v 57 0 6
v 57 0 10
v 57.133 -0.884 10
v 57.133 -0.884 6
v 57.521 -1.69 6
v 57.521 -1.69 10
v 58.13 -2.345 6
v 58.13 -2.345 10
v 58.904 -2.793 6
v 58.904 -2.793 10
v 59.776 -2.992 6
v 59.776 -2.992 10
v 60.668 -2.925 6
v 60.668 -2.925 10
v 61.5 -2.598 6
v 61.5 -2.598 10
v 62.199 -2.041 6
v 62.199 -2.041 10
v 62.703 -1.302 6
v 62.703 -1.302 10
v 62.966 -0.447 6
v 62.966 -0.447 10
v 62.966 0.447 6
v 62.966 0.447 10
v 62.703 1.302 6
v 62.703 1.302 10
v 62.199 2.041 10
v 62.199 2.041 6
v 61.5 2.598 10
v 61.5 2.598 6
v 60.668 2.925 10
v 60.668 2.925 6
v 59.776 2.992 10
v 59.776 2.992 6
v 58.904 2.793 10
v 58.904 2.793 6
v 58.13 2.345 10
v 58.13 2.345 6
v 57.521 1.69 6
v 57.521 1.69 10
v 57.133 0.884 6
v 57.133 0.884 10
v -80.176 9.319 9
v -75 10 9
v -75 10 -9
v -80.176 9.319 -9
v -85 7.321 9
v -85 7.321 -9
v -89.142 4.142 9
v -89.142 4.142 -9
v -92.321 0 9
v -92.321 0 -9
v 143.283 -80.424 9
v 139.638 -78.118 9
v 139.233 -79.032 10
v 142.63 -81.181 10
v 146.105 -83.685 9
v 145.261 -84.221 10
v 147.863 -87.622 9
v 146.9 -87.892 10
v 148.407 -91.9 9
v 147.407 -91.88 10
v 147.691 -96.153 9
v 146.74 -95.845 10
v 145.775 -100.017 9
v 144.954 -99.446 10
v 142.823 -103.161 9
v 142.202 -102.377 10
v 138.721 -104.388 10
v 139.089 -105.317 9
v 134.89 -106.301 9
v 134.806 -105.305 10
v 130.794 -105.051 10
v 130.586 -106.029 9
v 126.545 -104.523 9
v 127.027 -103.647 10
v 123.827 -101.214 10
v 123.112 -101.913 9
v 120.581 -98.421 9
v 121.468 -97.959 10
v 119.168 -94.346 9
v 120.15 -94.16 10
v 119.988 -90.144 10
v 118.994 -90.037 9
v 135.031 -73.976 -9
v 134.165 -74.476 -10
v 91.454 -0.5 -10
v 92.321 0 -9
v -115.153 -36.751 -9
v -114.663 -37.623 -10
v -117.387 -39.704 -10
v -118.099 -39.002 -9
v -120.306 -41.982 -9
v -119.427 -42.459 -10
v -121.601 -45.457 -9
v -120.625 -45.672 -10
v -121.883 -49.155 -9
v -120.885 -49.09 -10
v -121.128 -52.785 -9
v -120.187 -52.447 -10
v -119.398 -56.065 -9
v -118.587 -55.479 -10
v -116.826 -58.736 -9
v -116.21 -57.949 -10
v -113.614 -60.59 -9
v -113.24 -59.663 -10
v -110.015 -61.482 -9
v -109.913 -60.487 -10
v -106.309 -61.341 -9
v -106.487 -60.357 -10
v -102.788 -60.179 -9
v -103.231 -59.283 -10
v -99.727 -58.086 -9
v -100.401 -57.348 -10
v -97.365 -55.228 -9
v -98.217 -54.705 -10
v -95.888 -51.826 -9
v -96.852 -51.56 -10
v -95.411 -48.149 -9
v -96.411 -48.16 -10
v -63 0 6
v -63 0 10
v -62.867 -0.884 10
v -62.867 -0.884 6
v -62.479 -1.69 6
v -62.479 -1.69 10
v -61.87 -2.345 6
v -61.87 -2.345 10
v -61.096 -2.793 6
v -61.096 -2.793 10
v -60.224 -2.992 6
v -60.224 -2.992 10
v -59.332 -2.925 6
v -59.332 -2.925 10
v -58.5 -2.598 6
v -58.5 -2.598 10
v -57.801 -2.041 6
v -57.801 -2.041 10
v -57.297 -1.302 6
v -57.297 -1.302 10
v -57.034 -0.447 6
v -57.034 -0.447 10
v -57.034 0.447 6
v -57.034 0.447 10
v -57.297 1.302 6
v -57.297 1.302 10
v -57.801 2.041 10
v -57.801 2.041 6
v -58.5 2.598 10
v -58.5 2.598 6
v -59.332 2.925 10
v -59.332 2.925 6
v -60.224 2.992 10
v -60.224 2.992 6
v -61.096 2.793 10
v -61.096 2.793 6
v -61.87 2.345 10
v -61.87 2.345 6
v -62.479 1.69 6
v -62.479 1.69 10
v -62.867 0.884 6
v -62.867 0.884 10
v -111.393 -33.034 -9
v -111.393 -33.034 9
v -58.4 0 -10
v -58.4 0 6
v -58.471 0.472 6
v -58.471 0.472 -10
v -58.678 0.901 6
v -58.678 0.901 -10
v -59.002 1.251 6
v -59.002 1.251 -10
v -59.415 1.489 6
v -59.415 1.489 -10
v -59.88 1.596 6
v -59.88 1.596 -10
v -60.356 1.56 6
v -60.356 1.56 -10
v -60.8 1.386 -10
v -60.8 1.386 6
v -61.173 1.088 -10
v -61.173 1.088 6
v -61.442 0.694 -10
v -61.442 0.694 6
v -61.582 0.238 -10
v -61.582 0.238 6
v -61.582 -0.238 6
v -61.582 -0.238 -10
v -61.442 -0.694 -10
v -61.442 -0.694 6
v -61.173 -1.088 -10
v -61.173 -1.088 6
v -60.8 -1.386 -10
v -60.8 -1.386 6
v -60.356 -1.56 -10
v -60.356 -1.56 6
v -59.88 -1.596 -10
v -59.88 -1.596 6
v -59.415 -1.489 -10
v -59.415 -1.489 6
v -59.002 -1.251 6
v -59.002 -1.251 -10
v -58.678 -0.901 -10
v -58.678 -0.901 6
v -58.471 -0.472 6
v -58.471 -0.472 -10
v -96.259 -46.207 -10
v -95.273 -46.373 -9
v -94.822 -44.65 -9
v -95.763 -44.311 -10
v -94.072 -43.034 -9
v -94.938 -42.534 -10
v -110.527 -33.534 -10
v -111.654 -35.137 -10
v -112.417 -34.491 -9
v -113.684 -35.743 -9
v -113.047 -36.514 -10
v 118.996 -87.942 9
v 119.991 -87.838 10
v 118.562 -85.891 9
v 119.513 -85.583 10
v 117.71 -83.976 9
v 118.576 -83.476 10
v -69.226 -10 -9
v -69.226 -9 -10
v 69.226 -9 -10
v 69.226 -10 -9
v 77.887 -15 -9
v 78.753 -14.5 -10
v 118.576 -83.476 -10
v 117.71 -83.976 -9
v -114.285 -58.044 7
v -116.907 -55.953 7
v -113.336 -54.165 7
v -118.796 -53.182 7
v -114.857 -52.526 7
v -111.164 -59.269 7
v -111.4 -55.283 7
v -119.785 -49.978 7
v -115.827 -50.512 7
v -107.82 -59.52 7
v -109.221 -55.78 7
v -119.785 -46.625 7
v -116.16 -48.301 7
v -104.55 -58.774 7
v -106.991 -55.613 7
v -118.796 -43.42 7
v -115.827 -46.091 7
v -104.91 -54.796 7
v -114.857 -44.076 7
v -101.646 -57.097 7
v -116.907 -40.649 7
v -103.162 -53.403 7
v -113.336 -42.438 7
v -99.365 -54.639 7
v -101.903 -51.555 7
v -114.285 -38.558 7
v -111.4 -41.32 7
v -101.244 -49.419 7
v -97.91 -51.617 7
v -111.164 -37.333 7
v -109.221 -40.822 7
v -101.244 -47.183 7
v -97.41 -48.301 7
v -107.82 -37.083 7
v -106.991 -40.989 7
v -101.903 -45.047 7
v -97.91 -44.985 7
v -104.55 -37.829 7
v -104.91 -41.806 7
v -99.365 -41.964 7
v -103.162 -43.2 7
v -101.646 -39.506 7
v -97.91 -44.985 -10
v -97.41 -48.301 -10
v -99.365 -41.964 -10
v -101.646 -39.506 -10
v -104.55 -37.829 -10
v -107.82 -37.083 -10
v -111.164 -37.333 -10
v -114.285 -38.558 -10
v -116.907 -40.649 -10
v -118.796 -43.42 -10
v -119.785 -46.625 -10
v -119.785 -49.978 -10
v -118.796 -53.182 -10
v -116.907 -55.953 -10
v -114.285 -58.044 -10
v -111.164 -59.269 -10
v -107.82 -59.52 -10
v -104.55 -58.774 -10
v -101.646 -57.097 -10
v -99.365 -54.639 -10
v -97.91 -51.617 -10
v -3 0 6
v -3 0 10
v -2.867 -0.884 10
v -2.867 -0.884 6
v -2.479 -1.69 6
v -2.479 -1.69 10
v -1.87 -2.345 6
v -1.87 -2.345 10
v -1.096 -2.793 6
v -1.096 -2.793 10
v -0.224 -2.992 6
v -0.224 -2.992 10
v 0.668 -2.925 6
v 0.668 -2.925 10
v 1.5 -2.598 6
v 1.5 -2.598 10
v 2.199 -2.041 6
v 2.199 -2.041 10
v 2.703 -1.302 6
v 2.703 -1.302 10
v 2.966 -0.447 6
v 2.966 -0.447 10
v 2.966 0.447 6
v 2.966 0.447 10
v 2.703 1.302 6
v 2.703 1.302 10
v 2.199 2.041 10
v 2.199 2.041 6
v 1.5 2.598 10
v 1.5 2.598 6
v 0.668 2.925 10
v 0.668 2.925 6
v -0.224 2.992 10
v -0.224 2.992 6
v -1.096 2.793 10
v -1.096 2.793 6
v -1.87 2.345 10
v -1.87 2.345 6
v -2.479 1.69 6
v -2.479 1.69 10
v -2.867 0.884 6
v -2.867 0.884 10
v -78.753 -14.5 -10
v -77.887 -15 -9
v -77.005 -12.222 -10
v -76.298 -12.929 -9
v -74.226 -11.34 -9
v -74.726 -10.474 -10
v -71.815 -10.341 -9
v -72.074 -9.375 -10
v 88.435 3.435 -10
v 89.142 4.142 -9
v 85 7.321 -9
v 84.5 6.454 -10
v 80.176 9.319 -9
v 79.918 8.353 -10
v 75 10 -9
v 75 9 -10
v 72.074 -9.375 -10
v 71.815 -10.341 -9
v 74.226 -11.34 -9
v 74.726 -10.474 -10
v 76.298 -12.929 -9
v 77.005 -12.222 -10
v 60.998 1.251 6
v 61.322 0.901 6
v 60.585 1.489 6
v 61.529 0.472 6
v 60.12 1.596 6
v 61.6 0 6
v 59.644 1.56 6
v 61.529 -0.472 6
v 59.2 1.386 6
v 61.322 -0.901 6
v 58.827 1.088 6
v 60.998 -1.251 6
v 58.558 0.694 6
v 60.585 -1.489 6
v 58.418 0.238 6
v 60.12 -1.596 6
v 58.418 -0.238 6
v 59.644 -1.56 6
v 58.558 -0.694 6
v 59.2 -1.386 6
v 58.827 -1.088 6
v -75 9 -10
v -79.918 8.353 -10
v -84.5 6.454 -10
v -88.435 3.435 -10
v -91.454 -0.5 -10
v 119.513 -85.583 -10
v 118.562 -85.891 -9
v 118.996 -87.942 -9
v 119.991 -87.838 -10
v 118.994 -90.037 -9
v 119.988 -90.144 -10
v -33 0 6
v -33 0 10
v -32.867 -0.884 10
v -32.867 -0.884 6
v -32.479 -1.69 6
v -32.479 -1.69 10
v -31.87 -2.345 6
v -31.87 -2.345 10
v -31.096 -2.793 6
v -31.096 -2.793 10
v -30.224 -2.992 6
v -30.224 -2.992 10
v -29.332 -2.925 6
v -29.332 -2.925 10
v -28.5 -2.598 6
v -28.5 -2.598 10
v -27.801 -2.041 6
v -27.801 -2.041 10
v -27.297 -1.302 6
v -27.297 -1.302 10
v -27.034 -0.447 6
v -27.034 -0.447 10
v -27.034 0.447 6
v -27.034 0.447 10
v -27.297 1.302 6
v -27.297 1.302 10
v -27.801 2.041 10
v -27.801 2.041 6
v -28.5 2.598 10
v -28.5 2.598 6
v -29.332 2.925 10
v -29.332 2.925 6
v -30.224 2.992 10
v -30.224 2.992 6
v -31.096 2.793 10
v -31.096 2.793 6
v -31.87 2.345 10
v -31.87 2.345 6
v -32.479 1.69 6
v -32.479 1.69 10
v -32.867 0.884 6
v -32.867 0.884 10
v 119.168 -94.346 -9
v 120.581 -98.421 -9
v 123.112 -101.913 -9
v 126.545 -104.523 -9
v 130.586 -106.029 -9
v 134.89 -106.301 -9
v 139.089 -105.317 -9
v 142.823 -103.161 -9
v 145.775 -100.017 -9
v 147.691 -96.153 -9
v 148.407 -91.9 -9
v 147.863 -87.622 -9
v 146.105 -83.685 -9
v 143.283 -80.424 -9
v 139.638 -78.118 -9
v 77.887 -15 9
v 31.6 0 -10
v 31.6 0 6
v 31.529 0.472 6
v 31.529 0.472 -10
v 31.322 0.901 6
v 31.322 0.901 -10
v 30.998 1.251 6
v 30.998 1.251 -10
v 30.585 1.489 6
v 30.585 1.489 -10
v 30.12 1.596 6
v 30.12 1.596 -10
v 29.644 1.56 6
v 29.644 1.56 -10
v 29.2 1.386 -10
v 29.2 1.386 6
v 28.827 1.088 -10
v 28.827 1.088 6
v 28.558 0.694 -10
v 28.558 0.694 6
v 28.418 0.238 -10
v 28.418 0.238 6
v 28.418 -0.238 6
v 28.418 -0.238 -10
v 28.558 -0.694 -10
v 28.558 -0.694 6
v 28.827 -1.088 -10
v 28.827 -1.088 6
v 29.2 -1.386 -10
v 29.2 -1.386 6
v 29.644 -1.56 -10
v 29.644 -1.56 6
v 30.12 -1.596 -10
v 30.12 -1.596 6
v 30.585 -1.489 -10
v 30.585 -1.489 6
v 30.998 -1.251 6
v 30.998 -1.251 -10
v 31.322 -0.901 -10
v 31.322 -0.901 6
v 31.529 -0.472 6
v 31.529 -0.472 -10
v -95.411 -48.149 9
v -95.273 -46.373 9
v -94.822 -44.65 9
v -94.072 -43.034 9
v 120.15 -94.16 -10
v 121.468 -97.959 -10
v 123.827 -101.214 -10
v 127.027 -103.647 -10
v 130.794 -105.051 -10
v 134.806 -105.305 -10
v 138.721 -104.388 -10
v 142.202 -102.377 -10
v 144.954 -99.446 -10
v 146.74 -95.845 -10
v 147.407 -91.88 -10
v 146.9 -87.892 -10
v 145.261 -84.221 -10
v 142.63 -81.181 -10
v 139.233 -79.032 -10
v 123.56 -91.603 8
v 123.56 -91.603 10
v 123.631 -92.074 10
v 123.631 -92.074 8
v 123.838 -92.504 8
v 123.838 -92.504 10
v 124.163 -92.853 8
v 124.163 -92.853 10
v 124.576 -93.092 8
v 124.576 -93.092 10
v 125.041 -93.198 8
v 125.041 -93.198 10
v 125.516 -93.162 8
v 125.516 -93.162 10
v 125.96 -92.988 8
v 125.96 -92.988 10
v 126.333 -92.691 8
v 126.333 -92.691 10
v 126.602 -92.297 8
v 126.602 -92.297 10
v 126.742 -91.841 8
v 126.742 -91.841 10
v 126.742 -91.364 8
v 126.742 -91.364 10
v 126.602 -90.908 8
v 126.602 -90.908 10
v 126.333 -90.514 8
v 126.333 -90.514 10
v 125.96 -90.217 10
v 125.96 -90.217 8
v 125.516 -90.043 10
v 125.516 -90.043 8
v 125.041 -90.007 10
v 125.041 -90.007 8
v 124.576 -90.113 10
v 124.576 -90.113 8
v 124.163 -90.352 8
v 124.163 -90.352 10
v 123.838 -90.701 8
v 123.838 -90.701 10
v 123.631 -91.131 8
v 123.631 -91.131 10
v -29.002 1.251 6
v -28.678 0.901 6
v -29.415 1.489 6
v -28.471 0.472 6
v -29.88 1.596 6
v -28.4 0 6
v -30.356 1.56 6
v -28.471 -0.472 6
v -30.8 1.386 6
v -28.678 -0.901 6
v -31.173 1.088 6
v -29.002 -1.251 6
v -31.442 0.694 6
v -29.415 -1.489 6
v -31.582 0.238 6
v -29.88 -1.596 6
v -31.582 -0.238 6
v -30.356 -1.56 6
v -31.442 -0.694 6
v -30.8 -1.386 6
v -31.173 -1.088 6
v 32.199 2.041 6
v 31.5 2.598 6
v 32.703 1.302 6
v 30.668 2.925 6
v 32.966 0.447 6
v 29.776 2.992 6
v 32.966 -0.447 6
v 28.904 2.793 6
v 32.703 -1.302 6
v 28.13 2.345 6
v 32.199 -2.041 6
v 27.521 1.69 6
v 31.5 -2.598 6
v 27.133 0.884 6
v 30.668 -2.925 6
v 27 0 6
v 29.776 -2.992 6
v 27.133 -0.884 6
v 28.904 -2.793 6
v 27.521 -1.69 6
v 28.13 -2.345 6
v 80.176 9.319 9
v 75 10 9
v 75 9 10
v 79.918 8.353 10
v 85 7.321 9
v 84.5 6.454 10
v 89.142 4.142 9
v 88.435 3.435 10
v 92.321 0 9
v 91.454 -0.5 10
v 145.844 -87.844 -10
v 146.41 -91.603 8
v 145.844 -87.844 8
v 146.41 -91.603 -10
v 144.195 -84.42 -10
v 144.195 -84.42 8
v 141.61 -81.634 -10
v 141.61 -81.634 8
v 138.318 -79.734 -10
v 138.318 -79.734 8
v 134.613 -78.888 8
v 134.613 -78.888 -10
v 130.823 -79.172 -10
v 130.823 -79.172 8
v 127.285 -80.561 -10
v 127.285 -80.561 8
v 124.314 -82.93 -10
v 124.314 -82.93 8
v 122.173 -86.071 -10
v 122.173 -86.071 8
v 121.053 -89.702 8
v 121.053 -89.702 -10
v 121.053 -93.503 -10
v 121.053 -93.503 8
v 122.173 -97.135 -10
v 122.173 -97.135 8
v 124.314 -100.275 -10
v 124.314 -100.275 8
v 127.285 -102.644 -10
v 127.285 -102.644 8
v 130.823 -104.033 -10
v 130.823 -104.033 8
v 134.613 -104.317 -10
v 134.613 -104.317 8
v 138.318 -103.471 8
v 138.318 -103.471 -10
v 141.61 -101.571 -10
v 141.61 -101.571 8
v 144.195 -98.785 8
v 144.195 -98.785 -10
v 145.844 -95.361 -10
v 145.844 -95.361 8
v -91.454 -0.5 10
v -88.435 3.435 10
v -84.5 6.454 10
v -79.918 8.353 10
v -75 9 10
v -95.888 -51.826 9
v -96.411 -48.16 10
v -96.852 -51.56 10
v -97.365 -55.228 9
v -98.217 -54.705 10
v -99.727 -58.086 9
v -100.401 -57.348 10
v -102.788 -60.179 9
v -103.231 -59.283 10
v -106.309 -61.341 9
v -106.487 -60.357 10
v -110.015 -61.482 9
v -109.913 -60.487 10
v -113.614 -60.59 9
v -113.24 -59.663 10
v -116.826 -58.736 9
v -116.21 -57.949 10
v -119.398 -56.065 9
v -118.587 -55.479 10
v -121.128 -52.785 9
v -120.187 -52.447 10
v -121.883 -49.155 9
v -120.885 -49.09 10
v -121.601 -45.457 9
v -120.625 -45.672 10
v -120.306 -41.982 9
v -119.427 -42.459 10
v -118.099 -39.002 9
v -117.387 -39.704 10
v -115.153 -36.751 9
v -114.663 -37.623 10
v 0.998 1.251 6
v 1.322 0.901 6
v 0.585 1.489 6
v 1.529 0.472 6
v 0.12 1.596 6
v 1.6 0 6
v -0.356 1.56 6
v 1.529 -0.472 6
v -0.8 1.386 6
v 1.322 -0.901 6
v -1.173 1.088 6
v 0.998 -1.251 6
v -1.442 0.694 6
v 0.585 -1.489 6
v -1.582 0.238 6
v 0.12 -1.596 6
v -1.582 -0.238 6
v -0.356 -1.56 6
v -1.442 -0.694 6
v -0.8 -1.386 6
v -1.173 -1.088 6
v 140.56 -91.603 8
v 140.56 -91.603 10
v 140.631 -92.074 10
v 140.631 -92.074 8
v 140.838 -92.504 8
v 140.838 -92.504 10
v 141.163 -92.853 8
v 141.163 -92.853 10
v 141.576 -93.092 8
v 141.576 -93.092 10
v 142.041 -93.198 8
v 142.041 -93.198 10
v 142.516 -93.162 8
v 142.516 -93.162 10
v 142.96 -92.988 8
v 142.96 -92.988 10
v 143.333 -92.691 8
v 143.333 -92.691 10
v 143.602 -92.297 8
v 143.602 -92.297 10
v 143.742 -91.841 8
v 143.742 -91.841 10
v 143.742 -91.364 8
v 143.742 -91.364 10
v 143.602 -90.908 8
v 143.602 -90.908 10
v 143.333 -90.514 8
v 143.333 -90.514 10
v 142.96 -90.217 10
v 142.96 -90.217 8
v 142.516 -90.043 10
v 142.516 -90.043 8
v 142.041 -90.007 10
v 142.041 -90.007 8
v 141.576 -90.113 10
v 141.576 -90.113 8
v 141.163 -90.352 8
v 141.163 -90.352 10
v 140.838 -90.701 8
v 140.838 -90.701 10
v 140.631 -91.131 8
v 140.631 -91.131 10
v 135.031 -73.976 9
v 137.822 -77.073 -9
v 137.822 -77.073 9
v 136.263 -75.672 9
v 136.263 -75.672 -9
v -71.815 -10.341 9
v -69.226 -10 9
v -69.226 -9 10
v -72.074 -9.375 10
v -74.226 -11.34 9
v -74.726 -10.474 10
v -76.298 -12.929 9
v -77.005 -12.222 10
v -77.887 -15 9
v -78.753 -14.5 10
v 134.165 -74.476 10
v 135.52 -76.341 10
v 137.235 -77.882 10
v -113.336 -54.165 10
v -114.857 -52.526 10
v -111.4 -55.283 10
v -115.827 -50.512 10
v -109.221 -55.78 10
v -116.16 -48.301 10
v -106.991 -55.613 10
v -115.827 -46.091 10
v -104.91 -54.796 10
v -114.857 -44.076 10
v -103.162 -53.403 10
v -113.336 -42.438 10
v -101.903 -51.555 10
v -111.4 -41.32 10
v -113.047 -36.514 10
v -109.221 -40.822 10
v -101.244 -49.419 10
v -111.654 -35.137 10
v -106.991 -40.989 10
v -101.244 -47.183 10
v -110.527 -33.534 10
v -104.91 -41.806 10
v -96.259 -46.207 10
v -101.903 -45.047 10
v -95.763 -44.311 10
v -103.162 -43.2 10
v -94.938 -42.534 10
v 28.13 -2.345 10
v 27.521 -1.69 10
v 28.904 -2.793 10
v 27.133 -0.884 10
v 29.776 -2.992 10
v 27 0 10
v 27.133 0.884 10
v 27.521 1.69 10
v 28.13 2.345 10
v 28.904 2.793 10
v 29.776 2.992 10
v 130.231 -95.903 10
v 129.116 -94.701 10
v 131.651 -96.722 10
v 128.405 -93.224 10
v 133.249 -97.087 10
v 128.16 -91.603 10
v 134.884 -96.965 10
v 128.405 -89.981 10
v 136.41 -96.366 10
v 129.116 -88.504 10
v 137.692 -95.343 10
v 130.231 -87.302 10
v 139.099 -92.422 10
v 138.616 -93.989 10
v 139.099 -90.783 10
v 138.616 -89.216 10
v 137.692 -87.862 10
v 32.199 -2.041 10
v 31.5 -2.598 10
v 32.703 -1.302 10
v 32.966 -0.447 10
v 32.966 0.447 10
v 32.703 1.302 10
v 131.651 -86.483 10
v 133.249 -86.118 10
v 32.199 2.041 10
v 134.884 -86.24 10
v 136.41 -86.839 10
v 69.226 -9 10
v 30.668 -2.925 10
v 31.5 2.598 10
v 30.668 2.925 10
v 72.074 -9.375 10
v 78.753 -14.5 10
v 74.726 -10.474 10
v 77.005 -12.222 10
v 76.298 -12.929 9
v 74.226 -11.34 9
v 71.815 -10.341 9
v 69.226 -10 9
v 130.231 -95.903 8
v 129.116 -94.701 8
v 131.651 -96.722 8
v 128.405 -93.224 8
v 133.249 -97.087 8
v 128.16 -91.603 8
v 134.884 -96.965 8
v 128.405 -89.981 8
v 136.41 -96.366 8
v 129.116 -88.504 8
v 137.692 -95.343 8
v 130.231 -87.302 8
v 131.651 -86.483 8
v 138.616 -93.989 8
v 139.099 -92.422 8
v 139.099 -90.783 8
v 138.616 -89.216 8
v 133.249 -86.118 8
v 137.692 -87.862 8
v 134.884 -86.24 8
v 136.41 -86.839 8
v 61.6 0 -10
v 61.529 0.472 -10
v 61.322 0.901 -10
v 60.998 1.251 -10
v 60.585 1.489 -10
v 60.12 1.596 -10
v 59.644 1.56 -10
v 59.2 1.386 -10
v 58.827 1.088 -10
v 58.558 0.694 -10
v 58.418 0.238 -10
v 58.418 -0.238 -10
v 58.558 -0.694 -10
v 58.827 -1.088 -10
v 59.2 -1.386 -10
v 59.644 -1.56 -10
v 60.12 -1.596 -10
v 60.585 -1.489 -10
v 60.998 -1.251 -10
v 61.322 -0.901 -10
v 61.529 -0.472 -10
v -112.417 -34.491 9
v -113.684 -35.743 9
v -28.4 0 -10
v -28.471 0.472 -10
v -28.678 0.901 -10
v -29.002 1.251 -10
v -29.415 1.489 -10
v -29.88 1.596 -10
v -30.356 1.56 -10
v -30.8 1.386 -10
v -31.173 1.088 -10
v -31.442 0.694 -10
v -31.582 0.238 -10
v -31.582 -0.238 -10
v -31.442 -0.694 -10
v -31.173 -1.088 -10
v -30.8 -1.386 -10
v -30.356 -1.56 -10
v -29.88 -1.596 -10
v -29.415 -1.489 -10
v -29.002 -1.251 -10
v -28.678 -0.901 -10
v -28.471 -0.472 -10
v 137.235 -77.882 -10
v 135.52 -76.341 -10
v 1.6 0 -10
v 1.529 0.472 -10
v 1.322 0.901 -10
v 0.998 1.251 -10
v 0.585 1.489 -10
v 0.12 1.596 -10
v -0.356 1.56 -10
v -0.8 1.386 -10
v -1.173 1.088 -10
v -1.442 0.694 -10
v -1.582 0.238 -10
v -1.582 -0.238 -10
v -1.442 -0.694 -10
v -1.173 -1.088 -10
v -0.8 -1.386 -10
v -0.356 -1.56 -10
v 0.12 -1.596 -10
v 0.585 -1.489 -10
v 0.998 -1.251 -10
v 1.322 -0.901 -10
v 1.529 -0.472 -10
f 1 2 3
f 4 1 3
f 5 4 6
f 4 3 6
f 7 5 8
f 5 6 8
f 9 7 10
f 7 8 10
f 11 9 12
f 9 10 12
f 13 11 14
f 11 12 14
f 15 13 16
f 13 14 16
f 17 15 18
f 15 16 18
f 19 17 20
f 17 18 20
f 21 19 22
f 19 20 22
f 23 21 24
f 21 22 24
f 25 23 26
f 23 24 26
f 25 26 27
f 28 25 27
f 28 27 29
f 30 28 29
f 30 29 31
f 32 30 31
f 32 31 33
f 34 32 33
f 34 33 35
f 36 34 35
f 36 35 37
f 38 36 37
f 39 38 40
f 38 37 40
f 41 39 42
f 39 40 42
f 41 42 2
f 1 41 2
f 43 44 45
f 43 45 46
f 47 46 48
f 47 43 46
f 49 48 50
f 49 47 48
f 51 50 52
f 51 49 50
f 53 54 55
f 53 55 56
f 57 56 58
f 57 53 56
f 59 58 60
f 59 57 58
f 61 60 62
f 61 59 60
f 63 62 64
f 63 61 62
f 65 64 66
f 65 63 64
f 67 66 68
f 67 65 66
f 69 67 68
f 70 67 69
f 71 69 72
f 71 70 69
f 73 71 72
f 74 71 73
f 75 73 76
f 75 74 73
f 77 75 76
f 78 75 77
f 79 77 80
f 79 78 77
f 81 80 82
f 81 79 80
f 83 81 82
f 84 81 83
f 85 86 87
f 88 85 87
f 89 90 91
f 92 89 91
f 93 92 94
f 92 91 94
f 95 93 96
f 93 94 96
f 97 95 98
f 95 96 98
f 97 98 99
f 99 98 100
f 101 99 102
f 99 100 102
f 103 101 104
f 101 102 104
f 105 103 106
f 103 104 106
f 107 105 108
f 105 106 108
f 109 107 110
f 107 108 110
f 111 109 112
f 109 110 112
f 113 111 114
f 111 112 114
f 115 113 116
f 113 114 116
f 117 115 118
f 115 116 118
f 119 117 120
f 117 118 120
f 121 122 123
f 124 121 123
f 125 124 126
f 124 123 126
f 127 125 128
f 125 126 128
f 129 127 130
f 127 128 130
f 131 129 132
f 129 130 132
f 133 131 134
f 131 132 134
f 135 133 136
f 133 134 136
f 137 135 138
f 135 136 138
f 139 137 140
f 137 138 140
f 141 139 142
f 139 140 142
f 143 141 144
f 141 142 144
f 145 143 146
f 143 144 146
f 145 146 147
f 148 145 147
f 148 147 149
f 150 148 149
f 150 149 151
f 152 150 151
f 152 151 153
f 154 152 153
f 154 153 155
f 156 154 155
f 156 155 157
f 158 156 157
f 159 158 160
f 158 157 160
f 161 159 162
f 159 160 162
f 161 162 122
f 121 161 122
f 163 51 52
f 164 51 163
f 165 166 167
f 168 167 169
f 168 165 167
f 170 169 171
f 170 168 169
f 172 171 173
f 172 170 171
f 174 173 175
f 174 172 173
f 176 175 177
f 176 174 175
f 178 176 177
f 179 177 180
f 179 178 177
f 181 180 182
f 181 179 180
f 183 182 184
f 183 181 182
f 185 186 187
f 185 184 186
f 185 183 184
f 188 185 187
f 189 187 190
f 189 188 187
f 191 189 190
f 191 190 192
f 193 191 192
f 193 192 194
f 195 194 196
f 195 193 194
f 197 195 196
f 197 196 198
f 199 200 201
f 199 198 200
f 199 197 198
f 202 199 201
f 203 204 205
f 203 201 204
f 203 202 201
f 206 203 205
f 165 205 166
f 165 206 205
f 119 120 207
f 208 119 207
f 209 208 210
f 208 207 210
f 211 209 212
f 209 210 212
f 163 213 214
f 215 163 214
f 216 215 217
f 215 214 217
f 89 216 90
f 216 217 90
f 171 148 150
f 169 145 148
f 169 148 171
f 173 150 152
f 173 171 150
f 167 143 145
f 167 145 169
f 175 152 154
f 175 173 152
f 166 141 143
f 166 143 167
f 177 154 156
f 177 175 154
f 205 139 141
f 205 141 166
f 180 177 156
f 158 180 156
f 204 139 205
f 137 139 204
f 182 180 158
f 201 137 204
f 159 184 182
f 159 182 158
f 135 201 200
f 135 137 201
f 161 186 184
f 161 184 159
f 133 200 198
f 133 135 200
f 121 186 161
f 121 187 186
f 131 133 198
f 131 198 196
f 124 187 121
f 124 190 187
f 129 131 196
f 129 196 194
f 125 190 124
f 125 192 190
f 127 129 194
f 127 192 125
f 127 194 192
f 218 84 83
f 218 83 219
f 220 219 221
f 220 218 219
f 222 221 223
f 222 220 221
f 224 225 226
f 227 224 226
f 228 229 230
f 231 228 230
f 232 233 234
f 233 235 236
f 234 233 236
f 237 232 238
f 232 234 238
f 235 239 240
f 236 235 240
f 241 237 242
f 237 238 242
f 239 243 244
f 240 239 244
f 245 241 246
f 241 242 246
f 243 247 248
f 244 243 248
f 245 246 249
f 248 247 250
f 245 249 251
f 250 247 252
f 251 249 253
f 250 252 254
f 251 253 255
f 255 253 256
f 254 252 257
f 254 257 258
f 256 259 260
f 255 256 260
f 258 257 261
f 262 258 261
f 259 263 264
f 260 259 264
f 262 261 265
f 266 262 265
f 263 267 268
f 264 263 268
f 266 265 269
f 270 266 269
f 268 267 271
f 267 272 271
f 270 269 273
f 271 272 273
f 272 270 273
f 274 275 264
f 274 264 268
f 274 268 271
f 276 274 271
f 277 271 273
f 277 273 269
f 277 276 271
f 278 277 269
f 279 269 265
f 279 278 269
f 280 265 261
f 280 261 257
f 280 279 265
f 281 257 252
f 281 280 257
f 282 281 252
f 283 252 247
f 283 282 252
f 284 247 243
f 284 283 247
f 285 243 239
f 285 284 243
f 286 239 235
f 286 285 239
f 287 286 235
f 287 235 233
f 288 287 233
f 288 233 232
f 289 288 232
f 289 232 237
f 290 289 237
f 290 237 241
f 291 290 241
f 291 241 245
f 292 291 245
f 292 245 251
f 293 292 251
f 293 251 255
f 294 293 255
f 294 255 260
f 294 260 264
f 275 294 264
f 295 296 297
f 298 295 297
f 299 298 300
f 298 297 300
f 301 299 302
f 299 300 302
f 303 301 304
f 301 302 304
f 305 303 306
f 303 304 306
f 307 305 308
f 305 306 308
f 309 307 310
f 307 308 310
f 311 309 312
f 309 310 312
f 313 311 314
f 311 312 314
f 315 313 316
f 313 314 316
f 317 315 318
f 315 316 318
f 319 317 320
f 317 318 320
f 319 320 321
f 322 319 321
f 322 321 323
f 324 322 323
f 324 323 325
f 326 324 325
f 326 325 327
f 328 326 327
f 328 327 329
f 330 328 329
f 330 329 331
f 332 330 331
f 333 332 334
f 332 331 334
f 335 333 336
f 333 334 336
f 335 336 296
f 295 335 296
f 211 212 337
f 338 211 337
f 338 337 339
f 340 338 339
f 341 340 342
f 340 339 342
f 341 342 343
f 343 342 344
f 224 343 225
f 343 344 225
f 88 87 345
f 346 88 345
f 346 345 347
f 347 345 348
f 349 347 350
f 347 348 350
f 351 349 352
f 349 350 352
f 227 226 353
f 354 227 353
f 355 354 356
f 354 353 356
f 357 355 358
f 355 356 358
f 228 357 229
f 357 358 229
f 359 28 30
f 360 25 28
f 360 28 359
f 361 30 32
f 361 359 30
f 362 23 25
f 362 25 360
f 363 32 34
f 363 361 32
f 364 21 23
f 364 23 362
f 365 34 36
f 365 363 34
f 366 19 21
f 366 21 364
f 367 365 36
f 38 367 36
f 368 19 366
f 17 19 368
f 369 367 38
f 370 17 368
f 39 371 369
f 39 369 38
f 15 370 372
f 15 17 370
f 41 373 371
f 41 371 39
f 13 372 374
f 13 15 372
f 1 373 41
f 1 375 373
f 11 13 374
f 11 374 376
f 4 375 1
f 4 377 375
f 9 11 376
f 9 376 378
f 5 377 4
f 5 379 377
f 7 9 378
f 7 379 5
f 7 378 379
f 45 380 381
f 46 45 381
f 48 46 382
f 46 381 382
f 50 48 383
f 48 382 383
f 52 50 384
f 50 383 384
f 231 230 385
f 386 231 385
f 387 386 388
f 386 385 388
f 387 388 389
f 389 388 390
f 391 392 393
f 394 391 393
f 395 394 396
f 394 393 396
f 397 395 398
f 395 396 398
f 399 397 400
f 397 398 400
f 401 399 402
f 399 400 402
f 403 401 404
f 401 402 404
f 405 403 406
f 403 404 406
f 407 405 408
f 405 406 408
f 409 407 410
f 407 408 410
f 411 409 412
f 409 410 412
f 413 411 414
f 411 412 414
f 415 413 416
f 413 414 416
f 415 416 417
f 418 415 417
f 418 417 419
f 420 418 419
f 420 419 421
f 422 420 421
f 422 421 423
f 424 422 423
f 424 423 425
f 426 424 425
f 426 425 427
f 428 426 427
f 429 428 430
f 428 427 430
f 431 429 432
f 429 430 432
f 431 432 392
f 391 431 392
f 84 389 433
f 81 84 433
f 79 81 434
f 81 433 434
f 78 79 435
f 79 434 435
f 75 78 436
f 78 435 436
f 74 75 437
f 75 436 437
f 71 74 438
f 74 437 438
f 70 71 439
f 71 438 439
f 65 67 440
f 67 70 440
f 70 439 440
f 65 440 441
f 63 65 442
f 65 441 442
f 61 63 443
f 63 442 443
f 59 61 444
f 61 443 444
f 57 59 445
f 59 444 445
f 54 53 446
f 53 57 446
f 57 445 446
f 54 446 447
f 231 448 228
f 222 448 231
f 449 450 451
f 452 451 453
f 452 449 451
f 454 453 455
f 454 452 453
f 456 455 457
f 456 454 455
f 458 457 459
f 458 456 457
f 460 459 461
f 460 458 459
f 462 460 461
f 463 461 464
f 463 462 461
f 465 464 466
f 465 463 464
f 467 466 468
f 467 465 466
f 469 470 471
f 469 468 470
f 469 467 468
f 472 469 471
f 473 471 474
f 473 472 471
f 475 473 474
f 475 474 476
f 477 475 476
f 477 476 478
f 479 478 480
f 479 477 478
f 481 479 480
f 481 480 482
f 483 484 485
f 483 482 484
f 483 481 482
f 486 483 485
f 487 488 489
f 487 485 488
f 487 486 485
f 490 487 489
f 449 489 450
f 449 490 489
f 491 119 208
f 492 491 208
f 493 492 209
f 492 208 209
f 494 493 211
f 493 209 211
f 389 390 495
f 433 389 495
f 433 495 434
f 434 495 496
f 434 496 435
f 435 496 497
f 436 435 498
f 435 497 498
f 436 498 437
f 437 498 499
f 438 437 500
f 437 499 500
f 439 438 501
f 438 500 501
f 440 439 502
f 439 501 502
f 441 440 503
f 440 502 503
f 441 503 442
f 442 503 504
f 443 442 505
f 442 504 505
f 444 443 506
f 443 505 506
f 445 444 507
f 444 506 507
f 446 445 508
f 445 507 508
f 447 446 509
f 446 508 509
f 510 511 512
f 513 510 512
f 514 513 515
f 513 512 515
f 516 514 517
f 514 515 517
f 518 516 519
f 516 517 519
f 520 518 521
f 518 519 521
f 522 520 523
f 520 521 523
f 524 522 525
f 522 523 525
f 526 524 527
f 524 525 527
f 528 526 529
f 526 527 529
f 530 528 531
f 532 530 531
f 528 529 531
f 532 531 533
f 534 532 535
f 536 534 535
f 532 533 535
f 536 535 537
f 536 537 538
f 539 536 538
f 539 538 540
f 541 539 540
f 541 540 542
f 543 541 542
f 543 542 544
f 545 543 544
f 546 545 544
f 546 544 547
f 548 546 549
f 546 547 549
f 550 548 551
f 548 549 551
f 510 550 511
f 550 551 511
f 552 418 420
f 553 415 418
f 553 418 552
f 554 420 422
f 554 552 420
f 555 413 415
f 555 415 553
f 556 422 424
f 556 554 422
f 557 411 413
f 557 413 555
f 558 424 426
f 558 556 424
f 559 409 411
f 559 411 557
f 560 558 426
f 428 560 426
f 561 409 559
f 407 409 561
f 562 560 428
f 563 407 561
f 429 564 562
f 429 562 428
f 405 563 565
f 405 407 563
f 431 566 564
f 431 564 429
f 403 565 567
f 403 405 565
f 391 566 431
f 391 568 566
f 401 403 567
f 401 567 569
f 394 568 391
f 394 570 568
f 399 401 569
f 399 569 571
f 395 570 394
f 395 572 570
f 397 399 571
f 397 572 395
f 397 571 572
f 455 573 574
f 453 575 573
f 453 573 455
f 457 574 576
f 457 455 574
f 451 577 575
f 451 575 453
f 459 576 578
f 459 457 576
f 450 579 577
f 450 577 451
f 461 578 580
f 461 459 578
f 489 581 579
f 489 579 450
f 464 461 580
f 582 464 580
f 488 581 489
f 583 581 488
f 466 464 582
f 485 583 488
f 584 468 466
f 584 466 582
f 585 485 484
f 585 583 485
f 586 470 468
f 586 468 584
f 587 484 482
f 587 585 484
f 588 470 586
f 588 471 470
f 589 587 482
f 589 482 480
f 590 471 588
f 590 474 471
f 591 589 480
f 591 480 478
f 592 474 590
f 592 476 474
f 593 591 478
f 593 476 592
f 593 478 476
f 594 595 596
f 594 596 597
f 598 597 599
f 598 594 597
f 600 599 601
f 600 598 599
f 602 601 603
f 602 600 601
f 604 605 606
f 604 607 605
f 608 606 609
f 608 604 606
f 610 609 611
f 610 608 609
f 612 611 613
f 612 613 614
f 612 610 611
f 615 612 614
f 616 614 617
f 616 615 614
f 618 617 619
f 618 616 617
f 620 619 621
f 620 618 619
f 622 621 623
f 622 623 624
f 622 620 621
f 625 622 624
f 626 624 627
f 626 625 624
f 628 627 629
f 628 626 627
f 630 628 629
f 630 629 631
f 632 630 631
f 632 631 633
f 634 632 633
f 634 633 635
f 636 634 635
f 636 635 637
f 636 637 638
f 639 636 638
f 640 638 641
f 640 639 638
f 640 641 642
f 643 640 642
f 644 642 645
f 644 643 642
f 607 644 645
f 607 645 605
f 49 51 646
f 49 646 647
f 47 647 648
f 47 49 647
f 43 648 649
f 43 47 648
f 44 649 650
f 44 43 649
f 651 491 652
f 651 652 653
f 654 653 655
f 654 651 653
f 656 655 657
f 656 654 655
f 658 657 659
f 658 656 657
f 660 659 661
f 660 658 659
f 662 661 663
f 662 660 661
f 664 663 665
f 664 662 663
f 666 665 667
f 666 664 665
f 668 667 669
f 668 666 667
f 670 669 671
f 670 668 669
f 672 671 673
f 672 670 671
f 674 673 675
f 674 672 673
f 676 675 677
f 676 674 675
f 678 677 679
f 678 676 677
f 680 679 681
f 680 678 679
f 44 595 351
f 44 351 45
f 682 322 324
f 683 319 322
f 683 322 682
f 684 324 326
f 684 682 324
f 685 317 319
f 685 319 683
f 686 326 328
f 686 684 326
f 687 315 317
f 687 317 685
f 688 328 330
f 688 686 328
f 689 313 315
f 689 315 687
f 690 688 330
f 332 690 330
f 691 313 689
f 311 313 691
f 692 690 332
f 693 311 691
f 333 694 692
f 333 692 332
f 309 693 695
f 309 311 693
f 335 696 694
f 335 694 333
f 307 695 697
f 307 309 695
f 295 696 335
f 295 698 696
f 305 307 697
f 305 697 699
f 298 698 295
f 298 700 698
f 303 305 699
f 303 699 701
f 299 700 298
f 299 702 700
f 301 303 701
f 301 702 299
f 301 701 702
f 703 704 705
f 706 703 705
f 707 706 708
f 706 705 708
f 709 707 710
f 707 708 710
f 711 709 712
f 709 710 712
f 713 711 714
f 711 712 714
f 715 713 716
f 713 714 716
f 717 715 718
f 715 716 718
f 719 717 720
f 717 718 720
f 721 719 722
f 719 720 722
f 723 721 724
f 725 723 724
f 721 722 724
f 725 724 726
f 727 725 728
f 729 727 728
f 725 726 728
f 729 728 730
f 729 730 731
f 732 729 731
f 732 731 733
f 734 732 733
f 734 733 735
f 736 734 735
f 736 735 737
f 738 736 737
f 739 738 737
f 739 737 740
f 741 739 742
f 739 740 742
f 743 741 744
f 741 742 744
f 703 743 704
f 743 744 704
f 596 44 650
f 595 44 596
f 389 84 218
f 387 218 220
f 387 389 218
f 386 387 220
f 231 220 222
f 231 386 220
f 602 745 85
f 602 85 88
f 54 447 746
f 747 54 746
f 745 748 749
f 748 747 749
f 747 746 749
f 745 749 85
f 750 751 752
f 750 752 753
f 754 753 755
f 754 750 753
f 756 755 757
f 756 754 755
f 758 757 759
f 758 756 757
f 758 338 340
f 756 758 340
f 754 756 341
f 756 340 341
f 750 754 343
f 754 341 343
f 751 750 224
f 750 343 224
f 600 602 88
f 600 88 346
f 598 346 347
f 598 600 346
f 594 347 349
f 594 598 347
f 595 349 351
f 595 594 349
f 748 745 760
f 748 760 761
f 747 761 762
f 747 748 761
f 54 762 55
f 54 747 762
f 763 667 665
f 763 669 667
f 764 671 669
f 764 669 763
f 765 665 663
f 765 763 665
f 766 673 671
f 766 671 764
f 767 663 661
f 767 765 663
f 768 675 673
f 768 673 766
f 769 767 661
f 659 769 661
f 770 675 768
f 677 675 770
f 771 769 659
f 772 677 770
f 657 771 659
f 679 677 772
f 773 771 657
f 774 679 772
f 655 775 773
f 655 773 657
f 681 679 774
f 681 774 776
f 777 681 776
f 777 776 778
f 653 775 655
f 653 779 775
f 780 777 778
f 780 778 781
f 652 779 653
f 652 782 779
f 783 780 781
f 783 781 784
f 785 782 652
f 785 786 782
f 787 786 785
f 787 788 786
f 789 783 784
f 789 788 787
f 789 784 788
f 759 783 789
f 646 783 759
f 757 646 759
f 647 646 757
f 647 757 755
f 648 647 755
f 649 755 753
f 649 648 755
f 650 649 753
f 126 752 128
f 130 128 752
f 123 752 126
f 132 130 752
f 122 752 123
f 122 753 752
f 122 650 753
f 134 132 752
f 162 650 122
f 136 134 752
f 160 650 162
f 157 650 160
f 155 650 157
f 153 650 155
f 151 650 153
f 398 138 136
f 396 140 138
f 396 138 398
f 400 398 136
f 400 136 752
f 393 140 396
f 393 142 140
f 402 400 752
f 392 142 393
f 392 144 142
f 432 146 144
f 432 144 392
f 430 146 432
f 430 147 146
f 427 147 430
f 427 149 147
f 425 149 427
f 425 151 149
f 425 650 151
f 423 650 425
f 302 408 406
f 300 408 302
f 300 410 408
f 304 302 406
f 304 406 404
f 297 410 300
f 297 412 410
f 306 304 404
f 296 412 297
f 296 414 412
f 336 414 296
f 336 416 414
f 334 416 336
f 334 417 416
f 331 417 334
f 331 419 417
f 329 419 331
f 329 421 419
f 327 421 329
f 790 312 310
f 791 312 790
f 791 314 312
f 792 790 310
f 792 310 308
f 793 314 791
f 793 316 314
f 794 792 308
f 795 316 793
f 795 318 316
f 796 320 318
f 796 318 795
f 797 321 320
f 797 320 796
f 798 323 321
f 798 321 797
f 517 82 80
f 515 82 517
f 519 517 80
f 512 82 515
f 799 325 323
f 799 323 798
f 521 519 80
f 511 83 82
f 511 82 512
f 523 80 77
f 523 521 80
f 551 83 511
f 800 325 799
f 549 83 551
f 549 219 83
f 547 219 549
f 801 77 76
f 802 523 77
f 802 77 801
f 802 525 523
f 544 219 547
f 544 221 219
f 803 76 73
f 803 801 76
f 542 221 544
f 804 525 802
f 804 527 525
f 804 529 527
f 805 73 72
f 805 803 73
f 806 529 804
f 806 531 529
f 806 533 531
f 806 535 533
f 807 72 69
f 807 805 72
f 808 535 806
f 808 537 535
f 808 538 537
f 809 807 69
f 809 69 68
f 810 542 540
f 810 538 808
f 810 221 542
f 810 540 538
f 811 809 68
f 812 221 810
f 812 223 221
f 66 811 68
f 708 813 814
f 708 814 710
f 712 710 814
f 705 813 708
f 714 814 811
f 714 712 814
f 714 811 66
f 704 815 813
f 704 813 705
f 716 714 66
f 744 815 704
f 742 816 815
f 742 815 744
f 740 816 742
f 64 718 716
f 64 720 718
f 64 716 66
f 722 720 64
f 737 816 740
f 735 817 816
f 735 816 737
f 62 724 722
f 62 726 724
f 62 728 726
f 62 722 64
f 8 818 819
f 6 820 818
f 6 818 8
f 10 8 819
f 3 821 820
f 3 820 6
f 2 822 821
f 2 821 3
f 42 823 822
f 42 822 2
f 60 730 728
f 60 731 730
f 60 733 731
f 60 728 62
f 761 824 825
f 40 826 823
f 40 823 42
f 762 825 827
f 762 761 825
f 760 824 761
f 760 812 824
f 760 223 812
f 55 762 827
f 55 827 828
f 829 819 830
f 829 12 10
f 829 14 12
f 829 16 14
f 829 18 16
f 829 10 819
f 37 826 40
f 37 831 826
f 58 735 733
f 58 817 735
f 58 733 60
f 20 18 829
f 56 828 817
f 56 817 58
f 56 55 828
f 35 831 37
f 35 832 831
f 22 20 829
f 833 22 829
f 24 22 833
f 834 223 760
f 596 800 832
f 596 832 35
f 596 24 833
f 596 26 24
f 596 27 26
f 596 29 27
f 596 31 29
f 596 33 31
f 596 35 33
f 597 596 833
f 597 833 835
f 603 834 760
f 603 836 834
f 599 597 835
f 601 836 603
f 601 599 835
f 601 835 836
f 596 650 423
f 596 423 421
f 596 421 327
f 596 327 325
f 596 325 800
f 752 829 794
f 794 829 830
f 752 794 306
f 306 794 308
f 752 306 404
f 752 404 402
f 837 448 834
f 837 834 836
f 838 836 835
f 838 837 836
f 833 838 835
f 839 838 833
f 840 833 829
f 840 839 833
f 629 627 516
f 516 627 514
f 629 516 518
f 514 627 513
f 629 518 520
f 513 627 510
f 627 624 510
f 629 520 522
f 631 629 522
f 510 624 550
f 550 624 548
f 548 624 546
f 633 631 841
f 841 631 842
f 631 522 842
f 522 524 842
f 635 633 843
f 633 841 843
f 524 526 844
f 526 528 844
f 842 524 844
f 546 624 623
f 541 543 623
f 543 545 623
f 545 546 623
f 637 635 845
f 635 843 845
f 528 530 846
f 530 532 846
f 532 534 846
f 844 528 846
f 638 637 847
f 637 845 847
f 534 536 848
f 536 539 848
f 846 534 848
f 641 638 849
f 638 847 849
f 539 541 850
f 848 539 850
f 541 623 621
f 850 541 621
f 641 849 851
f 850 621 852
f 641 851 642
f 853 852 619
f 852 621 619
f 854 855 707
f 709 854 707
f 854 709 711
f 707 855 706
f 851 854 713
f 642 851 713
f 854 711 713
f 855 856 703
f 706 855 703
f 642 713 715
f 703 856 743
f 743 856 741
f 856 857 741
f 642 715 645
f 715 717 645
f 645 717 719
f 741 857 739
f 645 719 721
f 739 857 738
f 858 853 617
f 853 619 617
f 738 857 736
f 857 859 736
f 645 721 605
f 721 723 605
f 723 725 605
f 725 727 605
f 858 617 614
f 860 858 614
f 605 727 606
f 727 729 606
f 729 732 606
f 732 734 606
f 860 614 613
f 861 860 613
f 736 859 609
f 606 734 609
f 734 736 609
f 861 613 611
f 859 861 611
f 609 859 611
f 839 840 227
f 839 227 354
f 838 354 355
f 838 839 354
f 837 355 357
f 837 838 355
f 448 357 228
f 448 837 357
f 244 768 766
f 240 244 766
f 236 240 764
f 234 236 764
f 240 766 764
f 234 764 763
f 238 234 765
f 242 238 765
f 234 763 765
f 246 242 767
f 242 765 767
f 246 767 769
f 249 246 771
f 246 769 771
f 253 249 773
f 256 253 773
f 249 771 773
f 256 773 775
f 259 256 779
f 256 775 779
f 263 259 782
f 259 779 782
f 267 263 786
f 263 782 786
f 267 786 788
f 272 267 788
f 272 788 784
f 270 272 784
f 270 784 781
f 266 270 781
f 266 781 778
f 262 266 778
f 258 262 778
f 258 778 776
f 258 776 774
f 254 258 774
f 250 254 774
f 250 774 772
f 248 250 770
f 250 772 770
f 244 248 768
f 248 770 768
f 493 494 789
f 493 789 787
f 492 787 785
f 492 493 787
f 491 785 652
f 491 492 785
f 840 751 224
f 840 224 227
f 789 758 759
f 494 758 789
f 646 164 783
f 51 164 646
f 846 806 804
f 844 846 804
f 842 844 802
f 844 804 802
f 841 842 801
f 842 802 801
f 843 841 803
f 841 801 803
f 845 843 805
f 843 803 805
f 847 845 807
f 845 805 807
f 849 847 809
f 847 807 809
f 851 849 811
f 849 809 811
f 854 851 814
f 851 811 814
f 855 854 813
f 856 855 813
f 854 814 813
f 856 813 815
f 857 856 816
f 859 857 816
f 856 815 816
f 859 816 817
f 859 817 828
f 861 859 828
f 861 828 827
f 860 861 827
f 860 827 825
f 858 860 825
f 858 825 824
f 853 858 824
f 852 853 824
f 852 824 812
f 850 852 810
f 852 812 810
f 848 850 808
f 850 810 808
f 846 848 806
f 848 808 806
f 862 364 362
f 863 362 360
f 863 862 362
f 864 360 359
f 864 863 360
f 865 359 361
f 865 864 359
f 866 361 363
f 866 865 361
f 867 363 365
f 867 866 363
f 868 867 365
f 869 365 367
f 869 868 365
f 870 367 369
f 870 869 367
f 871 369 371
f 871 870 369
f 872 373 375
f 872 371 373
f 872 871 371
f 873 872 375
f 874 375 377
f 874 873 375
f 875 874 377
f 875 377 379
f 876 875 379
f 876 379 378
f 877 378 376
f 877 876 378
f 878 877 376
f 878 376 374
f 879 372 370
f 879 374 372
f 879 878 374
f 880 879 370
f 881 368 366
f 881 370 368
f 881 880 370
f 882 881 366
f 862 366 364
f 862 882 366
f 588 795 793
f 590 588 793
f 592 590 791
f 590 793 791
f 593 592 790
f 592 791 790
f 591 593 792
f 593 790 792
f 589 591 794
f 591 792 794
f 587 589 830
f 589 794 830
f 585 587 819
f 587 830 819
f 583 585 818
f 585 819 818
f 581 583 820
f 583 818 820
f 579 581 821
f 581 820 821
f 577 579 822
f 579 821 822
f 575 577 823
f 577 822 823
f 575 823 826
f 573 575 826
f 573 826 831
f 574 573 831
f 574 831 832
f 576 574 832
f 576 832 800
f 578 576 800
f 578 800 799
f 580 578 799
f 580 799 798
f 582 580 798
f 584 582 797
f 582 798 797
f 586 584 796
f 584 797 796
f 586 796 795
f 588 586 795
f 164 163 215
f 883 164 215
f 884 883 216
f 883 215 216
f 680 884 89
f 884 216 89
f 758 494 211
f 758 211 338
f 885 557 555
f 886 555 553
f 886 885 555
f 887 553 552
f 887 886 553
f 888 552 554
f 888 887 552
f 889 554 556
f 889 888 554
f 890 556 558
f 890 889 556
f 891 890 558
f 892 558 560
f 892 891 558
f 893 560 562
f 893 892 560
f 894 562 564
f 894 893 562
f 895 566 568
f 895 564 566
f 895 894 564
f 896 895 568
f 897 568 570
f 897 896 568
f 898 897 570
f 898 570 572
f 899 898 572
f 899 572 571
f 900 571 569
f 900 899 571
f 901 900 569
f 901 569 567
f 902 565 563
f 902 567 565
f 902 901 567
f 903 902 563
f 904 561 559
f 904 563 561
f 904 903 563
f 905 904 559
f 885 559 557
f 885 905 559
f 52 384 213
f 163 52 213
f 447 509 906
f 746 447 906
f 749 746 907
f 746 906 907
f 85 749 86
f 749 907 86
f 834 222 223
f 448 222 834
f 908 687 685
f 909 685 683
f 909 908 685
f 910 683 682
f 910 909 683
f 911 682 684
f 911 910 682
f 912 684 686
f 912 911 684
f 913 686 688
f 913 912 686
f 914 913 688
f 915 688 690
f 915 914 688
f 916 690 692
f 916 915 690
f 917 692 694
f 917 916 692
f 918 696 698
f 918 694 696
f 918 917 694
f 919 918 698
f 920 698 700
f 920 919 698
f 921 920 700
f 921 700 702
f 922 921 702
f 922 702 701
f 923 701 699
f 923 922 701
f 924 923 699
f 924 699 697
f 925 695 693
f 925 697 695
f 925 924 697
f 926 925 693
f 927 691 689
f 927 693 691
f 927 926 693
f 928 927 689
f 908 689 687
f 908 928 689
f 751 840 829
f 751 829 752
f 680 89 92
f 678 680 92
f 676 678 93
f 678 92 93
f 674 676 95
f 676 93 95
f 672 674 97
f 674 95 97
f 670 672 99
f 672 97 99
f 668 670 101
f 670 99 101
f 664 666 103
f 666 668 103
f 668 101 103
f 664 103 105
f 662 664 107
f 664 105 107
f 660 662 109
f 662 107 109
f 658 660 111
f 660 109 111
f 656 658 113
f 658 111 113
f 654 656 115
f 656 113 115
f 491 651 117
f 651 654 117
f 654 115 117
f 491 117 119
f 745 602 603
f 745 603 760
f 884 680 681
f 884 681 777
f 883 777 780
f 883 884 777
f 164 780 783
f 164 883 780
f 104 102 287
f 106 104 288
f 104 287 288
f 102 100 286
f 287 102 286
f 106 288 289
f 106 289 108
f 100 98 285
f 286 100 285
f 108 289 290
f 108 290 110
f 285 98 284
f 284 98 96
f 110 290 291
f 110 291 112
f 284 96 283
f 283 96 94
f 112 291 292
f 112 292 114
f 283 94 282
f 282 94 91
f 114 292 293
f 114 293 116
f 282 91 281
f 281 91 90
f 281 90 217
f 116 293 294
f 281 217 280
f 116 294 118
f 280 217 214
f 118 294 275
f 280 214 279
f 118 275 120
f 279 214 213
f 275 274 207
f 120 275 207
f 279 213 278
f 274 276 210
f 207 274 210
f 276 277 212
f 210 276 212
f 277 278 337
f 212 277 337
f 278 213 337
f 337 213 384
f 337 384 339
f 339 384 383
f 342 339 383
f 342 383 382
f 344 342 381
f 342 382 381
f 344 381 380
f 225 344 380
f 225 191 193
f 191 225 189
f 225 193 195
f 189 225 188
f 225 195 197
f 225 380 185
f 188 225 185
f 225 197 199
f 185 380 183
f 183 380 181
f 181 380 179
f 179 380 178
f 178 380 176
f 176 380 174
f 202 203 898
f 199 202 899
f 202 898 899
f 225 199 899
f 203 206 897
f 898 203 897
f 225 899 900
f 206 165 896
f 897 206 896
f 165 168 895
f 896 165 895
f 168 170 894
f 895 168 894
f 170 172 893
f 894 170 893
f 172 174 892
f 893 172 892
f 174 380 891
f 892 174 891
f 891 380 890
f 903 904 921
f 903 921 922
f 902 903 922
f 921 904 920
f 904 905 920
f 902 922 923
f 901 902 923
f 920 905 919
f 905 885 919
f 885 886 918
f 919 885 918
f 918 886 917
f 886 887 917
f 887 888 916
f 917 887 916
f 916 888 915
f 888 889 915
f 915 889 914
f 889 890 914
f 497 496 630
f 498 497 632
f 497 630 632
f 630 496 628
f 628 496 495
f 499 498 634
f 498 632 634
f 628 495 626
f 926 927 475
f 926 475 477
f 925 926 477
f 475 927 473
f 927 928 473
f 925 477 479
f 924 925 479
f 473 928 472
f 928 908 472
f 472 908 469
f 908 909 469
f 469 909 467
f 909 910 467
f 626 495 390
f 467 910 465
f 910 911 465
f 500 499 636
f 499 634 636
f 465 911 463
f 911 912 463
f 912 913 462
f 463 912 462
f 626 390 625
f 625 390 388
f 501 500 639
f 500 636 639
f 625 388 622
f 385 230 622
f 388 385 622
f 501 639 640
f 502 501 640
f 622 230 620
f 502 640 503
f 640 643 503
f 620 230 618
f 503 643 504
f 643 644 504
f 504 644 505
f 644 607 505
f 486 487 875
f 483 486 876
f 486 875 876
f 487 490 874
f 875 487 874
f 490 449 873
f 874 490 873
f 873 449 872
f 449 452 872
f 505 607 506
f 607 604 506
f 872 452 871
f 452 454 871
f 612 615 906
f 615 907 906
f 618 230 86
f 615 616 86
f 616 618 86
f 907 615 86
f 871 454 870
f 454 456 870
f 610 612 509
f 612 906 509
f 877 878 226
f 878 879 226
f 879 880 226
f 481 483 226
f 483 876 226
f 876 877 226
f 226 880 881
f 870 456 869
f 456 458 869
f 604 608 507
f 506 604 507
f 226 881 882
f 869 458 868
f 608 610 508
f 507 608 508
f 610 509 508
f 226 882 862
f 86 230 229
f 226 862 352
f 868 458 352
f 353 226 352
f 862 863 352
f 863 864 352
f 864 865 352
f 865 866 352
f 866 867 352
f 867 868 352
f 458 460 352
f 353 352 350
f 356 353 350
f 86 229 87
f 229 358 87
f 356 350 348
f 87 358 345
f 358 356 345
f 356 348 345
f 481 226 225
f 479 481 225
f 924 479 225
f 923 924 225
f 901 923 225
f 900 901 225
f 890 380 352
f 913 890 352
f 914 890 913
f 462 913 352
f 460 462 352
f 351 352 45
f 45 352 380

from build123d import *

# Parameters (mm, degrees)
SKETCH1_R               = 1.6
BOSS_EXTRUDE1_DEPTH     = 10
SKETCH2_R               = 11.25
SKETCH2_R_2             = 12.75
CUT_EXTRUDE1_DEPTH      = 177.242290049
CUT_EXTRUDE1_DEPTH_BACK = 177.242290049
BOSS_EXTRUDE2_START     = -10
SKETCH2_3_R             = 13.25
SKETCH2_3_R_2           = 11.25
BOSS_EXTRUDE2_DEPTH     = 20
BOSS_EXTRUDE3_START     = 10
SKETCH2_4_R             = 11.25
SKETCH2_4_R_2           = 7.5
BOSS_EXTRUDE3_DEPTH     = 3
BOSS_EXTRUDE4_START     = -10
SKETCH2_5_R             = 14.75
SKETCH2_5_R_2           = 12.75
BOSS_EXTRUDE4_DEPTH     = 20
BOSS_EXTRUDE5_START     = 10
SKETCH2_6_R             = 12.75
SKETCH2_6_R_2           = 1.6
SKETCH2_6_R_3           = 5.5
BOSS_EXTRUDE5_DEPTH     = 2
FILLET1_R               = 10
CUT_EXTRUDE2_START      = 10
SKETCH3_R               = 3
CUT_EXTRUDE2_DEPTH      = 4
CHAMFER1_SIZE           = 1


with BuildPart() as part:
    # Sketch1 → Boss-Extrude1 (new, symmetric)
    with BuildSketch(Plane.XY):
        with BuildLine():
            Line((-75, -10), (75, -10))
            Line((75, -10), (125, -96.602540378))
            ThreePointArc((125, -96.602540378), (138.660254038, -100.262794416), (142.320508076, -86.602540378))
            Line((142.320508076, -86.602540378), (92.320508076, 0))
            ThreePointArc((92.320508076, 0), (85, 7.320508076), (75, 10))
            Line((75, 10), (-75, 10))
            ThreePointArc((-75, 10), (-85, 7.320508076), (-92.320508076, 0))
            Line((-92.320508076, 0), (-117.320508076, -43.301270189))
            ThreePointArc((-117.320508076, -43.301270189), (-113.660254038, -56.961524227), (-100, -53.301270189))
            Line((-100, -53.301270189), (-75, -10))
        make_face()
        Circle(SKETCH1_R, mode=Mode.SUBTRACT)
        with Locations((-60, 0)):
            Circle(SKETCH1_R, mode=Mode.SUBTRACT)
        with Locations((-30, 0)):
            Circle(SKETCH1_R, mode=Mode.SUBTRACT)
        with Locations((30, 0)):
            Circle(SKETCH1_R, mode=Mode.SUBTRACT)
        with Locations((60, 0)):
            Circle(SKETCH1_R, mode=Mode.SUBTRACT)
    extrude(amount=BOSS_EXTRUDE1_DEPTH, both=True)

    # Sketch2 → Cut-Extrude1 (cut, two sides)
    with BuildSketch(Plane.XY) as cut_extrude1_sk:
        with Locations((-108.660254038, -48.301270189)):
            Circle(SKETCH2_R)
        with Locations((133.660254038, -91.602540378)):
            Circle(SKETCH2_R_2)
    extrude(amount=CUT_EXTRUDE1_DEPTH, mode=Mode.SUBTRACT)
    extrude(cut_extrude1_sk.sketch, amount=-CUT_EXTRUDE1_DEPTH_BACK, mode=Mode.SUBTRACT)

    # Sketch2<3> → Boss-Extrude2 (add)
    with BuildSketch(Plane.XY.offset(BOSS_EXTRUDE2_START)):
        with Locations((-108.660254038, -48.301270189)):
            Circle(SKETCH2_3_R)
        with Locations((-108.660254038, -48.301270189)):
            Circle(SKETCH2_3_R_2, mode=Mode.SUBTRACT)
    extrude(amount=BOSS_EXTRUDE2_DEPTH)

    # Sketch2<4> → Boss-Extrude3 (add)
    with BuildSketch(Plane.XY.offset(BOSS_EXTRUDE3_START)):
        with Locations((-108.660254038, -48.301270189)):
            Circle(SKETCH2_4_R)
        with Locations(Location((-108.660254038, -48.301270189, 0), (0, 0, 180))):
            Circle(SKETCH2_4_R_2, mode=Mode.SUBTRACT)
    extrude(amount=-BOSS_EXTRUDE3_DEPTH)

    # Sketch2<5> → Boss-Extrude4 (add)
    with BuildSketch(Plane.XY.offset(BOSS_EXTRUDE4_START)):
        with Locations((133.660254038, -91.602540378)):
            Circle(SKETCH2_5_R)
        with Locations((133.660254038, -91.602540378)):
            Circle(SKETCH2_5_R_2, mode=Mode.SUBTRACT)
    extrude(amount=BOSS_EXTRUDE4_DEPTH)

    # Sketch2<6> → Boss-Extrude5 (add)
    with BuildSketch(Plane.XY.offset(BOSS_EXTRUDE5_START)):
        with Locations((133.660254038, -91.602540378)):
            Circle(SKETCH2_6_R)
        with Locations(Location((125.160254038, -91.602540378, 0), (0, 0, 180))):
            Circle(SKETCH2_6_R_2, mode=Mode.SUBTRACT)
        with Locations(Location((133.660254038, -91.602540378, 0), (0, 0, 180))):
            Circle(SKETCH2_6_R_3, mode=Mode.SUBTRACT)
        with Locations(Location((142.160254038, -91.602540378, 0), (0, 0, 180))):
            Circle(SKETCH2_6_R_2, mode=Mode.SUBTRACT)
    extrude(amount=-BOSS_EXTRUDE5_DEPTH)

    # Fillet1
    fillet1_edges = [part.edges().sort_by_distance(p)[0] for p in [
        (136.899195965, -77.212552359, 0),
        (119.578687889, -87.212552359, 0),
        (75, -10, 0),
        (-75, -10, 0),
        (-112.974173413, -35.773197727, 0),
        (-95.653665337, -45.773197727, 0),
    ]]
    fillet(fillet1_edges, radius=FILLET1_R)

    # Sketch3 → Cut-Extrude2 (cut)
    with BuildSketch(Plane.XY.offset(CUT_EXTRUDE2_START)):
        with Locations(Location((-60, 0, 0), (0, 0, 180))):
            Circle(SKETCH3_R)
        with Locations(Location((-30, 0, 0), (0, 0, 180))):
            Circle(SKETCH3_R)
        with Locations(Location((0, 0, 0), (0, 0, 180))):
            Circle(SKETCH3_R)
        with Locations(Location((30, 0, 0), (0, 0, 180))):
            Circle(SKETCH3_R)
        with Locations(Location((60, 0, 0), (0, 0, 180))):
            Circle(SKETCH3_R)
    extrude(amount=-CUT_EXTRUDE2_DEPTH, mode=Mode.SUBTRACT)

    # Chamfer1
    chamfer1_edges = [part.edges().sort_by_distance(p)[0] for p in [
        (-101.85653165, -16.516877333, -10),
        (-85, 7.320508076, -10),
        (0, 10, -10),
        (85, 7.320508076, -10),
        (141.035254038, -104.376415084, 10),
        (141.035254038, -104.376415084, -10),
        (113.675627248, -36.988151408, -10),
        (113.675627248, -36.988151408, 10),
        (-115.285254038, -59.776106789, -10),
        (-115.285254038, -59.776106789, 10),
        (-85.979399248, -29.016877333, -10),
        (-85.979399248, -29.016877333, 10),
        (97.798494845, -49.488151408, 10),
        (97.798494845, -49.488151408, -10),
        (0, -10, -10),
        (0, -10, 10),
        (137.005608205, -76.413071632, 10),
        (137.005608205, -76.413071632, -10),
        (-113.022539154, -35.145386139, -10),
        (-113.022539154, -35.145386139, 10),
        (-95.085781683, -45.501177894, 10),
        (-95.085781683, -45.501177894, -10),
        (118.83311115, -86.904967699, -10),
        (118.83311115, -86.904967699, 10),
        (74.226497308, -11.339745962, -10),
        (74.226497308, -11.339745962, 10),
        (-74.226497308, -11.339745962, -10),
        (-74.226497308, -11.339745962, 10),
        (85, 7.320508076, 10),
        (0, 10, 10),
        (-85, 7.320508076, 10),
        (-101.85653165, -16.516877333, 10),
    ]]
    chamfer(chamfer1_edges, length=CHAMFER1_SIZE)


solid = part.part
